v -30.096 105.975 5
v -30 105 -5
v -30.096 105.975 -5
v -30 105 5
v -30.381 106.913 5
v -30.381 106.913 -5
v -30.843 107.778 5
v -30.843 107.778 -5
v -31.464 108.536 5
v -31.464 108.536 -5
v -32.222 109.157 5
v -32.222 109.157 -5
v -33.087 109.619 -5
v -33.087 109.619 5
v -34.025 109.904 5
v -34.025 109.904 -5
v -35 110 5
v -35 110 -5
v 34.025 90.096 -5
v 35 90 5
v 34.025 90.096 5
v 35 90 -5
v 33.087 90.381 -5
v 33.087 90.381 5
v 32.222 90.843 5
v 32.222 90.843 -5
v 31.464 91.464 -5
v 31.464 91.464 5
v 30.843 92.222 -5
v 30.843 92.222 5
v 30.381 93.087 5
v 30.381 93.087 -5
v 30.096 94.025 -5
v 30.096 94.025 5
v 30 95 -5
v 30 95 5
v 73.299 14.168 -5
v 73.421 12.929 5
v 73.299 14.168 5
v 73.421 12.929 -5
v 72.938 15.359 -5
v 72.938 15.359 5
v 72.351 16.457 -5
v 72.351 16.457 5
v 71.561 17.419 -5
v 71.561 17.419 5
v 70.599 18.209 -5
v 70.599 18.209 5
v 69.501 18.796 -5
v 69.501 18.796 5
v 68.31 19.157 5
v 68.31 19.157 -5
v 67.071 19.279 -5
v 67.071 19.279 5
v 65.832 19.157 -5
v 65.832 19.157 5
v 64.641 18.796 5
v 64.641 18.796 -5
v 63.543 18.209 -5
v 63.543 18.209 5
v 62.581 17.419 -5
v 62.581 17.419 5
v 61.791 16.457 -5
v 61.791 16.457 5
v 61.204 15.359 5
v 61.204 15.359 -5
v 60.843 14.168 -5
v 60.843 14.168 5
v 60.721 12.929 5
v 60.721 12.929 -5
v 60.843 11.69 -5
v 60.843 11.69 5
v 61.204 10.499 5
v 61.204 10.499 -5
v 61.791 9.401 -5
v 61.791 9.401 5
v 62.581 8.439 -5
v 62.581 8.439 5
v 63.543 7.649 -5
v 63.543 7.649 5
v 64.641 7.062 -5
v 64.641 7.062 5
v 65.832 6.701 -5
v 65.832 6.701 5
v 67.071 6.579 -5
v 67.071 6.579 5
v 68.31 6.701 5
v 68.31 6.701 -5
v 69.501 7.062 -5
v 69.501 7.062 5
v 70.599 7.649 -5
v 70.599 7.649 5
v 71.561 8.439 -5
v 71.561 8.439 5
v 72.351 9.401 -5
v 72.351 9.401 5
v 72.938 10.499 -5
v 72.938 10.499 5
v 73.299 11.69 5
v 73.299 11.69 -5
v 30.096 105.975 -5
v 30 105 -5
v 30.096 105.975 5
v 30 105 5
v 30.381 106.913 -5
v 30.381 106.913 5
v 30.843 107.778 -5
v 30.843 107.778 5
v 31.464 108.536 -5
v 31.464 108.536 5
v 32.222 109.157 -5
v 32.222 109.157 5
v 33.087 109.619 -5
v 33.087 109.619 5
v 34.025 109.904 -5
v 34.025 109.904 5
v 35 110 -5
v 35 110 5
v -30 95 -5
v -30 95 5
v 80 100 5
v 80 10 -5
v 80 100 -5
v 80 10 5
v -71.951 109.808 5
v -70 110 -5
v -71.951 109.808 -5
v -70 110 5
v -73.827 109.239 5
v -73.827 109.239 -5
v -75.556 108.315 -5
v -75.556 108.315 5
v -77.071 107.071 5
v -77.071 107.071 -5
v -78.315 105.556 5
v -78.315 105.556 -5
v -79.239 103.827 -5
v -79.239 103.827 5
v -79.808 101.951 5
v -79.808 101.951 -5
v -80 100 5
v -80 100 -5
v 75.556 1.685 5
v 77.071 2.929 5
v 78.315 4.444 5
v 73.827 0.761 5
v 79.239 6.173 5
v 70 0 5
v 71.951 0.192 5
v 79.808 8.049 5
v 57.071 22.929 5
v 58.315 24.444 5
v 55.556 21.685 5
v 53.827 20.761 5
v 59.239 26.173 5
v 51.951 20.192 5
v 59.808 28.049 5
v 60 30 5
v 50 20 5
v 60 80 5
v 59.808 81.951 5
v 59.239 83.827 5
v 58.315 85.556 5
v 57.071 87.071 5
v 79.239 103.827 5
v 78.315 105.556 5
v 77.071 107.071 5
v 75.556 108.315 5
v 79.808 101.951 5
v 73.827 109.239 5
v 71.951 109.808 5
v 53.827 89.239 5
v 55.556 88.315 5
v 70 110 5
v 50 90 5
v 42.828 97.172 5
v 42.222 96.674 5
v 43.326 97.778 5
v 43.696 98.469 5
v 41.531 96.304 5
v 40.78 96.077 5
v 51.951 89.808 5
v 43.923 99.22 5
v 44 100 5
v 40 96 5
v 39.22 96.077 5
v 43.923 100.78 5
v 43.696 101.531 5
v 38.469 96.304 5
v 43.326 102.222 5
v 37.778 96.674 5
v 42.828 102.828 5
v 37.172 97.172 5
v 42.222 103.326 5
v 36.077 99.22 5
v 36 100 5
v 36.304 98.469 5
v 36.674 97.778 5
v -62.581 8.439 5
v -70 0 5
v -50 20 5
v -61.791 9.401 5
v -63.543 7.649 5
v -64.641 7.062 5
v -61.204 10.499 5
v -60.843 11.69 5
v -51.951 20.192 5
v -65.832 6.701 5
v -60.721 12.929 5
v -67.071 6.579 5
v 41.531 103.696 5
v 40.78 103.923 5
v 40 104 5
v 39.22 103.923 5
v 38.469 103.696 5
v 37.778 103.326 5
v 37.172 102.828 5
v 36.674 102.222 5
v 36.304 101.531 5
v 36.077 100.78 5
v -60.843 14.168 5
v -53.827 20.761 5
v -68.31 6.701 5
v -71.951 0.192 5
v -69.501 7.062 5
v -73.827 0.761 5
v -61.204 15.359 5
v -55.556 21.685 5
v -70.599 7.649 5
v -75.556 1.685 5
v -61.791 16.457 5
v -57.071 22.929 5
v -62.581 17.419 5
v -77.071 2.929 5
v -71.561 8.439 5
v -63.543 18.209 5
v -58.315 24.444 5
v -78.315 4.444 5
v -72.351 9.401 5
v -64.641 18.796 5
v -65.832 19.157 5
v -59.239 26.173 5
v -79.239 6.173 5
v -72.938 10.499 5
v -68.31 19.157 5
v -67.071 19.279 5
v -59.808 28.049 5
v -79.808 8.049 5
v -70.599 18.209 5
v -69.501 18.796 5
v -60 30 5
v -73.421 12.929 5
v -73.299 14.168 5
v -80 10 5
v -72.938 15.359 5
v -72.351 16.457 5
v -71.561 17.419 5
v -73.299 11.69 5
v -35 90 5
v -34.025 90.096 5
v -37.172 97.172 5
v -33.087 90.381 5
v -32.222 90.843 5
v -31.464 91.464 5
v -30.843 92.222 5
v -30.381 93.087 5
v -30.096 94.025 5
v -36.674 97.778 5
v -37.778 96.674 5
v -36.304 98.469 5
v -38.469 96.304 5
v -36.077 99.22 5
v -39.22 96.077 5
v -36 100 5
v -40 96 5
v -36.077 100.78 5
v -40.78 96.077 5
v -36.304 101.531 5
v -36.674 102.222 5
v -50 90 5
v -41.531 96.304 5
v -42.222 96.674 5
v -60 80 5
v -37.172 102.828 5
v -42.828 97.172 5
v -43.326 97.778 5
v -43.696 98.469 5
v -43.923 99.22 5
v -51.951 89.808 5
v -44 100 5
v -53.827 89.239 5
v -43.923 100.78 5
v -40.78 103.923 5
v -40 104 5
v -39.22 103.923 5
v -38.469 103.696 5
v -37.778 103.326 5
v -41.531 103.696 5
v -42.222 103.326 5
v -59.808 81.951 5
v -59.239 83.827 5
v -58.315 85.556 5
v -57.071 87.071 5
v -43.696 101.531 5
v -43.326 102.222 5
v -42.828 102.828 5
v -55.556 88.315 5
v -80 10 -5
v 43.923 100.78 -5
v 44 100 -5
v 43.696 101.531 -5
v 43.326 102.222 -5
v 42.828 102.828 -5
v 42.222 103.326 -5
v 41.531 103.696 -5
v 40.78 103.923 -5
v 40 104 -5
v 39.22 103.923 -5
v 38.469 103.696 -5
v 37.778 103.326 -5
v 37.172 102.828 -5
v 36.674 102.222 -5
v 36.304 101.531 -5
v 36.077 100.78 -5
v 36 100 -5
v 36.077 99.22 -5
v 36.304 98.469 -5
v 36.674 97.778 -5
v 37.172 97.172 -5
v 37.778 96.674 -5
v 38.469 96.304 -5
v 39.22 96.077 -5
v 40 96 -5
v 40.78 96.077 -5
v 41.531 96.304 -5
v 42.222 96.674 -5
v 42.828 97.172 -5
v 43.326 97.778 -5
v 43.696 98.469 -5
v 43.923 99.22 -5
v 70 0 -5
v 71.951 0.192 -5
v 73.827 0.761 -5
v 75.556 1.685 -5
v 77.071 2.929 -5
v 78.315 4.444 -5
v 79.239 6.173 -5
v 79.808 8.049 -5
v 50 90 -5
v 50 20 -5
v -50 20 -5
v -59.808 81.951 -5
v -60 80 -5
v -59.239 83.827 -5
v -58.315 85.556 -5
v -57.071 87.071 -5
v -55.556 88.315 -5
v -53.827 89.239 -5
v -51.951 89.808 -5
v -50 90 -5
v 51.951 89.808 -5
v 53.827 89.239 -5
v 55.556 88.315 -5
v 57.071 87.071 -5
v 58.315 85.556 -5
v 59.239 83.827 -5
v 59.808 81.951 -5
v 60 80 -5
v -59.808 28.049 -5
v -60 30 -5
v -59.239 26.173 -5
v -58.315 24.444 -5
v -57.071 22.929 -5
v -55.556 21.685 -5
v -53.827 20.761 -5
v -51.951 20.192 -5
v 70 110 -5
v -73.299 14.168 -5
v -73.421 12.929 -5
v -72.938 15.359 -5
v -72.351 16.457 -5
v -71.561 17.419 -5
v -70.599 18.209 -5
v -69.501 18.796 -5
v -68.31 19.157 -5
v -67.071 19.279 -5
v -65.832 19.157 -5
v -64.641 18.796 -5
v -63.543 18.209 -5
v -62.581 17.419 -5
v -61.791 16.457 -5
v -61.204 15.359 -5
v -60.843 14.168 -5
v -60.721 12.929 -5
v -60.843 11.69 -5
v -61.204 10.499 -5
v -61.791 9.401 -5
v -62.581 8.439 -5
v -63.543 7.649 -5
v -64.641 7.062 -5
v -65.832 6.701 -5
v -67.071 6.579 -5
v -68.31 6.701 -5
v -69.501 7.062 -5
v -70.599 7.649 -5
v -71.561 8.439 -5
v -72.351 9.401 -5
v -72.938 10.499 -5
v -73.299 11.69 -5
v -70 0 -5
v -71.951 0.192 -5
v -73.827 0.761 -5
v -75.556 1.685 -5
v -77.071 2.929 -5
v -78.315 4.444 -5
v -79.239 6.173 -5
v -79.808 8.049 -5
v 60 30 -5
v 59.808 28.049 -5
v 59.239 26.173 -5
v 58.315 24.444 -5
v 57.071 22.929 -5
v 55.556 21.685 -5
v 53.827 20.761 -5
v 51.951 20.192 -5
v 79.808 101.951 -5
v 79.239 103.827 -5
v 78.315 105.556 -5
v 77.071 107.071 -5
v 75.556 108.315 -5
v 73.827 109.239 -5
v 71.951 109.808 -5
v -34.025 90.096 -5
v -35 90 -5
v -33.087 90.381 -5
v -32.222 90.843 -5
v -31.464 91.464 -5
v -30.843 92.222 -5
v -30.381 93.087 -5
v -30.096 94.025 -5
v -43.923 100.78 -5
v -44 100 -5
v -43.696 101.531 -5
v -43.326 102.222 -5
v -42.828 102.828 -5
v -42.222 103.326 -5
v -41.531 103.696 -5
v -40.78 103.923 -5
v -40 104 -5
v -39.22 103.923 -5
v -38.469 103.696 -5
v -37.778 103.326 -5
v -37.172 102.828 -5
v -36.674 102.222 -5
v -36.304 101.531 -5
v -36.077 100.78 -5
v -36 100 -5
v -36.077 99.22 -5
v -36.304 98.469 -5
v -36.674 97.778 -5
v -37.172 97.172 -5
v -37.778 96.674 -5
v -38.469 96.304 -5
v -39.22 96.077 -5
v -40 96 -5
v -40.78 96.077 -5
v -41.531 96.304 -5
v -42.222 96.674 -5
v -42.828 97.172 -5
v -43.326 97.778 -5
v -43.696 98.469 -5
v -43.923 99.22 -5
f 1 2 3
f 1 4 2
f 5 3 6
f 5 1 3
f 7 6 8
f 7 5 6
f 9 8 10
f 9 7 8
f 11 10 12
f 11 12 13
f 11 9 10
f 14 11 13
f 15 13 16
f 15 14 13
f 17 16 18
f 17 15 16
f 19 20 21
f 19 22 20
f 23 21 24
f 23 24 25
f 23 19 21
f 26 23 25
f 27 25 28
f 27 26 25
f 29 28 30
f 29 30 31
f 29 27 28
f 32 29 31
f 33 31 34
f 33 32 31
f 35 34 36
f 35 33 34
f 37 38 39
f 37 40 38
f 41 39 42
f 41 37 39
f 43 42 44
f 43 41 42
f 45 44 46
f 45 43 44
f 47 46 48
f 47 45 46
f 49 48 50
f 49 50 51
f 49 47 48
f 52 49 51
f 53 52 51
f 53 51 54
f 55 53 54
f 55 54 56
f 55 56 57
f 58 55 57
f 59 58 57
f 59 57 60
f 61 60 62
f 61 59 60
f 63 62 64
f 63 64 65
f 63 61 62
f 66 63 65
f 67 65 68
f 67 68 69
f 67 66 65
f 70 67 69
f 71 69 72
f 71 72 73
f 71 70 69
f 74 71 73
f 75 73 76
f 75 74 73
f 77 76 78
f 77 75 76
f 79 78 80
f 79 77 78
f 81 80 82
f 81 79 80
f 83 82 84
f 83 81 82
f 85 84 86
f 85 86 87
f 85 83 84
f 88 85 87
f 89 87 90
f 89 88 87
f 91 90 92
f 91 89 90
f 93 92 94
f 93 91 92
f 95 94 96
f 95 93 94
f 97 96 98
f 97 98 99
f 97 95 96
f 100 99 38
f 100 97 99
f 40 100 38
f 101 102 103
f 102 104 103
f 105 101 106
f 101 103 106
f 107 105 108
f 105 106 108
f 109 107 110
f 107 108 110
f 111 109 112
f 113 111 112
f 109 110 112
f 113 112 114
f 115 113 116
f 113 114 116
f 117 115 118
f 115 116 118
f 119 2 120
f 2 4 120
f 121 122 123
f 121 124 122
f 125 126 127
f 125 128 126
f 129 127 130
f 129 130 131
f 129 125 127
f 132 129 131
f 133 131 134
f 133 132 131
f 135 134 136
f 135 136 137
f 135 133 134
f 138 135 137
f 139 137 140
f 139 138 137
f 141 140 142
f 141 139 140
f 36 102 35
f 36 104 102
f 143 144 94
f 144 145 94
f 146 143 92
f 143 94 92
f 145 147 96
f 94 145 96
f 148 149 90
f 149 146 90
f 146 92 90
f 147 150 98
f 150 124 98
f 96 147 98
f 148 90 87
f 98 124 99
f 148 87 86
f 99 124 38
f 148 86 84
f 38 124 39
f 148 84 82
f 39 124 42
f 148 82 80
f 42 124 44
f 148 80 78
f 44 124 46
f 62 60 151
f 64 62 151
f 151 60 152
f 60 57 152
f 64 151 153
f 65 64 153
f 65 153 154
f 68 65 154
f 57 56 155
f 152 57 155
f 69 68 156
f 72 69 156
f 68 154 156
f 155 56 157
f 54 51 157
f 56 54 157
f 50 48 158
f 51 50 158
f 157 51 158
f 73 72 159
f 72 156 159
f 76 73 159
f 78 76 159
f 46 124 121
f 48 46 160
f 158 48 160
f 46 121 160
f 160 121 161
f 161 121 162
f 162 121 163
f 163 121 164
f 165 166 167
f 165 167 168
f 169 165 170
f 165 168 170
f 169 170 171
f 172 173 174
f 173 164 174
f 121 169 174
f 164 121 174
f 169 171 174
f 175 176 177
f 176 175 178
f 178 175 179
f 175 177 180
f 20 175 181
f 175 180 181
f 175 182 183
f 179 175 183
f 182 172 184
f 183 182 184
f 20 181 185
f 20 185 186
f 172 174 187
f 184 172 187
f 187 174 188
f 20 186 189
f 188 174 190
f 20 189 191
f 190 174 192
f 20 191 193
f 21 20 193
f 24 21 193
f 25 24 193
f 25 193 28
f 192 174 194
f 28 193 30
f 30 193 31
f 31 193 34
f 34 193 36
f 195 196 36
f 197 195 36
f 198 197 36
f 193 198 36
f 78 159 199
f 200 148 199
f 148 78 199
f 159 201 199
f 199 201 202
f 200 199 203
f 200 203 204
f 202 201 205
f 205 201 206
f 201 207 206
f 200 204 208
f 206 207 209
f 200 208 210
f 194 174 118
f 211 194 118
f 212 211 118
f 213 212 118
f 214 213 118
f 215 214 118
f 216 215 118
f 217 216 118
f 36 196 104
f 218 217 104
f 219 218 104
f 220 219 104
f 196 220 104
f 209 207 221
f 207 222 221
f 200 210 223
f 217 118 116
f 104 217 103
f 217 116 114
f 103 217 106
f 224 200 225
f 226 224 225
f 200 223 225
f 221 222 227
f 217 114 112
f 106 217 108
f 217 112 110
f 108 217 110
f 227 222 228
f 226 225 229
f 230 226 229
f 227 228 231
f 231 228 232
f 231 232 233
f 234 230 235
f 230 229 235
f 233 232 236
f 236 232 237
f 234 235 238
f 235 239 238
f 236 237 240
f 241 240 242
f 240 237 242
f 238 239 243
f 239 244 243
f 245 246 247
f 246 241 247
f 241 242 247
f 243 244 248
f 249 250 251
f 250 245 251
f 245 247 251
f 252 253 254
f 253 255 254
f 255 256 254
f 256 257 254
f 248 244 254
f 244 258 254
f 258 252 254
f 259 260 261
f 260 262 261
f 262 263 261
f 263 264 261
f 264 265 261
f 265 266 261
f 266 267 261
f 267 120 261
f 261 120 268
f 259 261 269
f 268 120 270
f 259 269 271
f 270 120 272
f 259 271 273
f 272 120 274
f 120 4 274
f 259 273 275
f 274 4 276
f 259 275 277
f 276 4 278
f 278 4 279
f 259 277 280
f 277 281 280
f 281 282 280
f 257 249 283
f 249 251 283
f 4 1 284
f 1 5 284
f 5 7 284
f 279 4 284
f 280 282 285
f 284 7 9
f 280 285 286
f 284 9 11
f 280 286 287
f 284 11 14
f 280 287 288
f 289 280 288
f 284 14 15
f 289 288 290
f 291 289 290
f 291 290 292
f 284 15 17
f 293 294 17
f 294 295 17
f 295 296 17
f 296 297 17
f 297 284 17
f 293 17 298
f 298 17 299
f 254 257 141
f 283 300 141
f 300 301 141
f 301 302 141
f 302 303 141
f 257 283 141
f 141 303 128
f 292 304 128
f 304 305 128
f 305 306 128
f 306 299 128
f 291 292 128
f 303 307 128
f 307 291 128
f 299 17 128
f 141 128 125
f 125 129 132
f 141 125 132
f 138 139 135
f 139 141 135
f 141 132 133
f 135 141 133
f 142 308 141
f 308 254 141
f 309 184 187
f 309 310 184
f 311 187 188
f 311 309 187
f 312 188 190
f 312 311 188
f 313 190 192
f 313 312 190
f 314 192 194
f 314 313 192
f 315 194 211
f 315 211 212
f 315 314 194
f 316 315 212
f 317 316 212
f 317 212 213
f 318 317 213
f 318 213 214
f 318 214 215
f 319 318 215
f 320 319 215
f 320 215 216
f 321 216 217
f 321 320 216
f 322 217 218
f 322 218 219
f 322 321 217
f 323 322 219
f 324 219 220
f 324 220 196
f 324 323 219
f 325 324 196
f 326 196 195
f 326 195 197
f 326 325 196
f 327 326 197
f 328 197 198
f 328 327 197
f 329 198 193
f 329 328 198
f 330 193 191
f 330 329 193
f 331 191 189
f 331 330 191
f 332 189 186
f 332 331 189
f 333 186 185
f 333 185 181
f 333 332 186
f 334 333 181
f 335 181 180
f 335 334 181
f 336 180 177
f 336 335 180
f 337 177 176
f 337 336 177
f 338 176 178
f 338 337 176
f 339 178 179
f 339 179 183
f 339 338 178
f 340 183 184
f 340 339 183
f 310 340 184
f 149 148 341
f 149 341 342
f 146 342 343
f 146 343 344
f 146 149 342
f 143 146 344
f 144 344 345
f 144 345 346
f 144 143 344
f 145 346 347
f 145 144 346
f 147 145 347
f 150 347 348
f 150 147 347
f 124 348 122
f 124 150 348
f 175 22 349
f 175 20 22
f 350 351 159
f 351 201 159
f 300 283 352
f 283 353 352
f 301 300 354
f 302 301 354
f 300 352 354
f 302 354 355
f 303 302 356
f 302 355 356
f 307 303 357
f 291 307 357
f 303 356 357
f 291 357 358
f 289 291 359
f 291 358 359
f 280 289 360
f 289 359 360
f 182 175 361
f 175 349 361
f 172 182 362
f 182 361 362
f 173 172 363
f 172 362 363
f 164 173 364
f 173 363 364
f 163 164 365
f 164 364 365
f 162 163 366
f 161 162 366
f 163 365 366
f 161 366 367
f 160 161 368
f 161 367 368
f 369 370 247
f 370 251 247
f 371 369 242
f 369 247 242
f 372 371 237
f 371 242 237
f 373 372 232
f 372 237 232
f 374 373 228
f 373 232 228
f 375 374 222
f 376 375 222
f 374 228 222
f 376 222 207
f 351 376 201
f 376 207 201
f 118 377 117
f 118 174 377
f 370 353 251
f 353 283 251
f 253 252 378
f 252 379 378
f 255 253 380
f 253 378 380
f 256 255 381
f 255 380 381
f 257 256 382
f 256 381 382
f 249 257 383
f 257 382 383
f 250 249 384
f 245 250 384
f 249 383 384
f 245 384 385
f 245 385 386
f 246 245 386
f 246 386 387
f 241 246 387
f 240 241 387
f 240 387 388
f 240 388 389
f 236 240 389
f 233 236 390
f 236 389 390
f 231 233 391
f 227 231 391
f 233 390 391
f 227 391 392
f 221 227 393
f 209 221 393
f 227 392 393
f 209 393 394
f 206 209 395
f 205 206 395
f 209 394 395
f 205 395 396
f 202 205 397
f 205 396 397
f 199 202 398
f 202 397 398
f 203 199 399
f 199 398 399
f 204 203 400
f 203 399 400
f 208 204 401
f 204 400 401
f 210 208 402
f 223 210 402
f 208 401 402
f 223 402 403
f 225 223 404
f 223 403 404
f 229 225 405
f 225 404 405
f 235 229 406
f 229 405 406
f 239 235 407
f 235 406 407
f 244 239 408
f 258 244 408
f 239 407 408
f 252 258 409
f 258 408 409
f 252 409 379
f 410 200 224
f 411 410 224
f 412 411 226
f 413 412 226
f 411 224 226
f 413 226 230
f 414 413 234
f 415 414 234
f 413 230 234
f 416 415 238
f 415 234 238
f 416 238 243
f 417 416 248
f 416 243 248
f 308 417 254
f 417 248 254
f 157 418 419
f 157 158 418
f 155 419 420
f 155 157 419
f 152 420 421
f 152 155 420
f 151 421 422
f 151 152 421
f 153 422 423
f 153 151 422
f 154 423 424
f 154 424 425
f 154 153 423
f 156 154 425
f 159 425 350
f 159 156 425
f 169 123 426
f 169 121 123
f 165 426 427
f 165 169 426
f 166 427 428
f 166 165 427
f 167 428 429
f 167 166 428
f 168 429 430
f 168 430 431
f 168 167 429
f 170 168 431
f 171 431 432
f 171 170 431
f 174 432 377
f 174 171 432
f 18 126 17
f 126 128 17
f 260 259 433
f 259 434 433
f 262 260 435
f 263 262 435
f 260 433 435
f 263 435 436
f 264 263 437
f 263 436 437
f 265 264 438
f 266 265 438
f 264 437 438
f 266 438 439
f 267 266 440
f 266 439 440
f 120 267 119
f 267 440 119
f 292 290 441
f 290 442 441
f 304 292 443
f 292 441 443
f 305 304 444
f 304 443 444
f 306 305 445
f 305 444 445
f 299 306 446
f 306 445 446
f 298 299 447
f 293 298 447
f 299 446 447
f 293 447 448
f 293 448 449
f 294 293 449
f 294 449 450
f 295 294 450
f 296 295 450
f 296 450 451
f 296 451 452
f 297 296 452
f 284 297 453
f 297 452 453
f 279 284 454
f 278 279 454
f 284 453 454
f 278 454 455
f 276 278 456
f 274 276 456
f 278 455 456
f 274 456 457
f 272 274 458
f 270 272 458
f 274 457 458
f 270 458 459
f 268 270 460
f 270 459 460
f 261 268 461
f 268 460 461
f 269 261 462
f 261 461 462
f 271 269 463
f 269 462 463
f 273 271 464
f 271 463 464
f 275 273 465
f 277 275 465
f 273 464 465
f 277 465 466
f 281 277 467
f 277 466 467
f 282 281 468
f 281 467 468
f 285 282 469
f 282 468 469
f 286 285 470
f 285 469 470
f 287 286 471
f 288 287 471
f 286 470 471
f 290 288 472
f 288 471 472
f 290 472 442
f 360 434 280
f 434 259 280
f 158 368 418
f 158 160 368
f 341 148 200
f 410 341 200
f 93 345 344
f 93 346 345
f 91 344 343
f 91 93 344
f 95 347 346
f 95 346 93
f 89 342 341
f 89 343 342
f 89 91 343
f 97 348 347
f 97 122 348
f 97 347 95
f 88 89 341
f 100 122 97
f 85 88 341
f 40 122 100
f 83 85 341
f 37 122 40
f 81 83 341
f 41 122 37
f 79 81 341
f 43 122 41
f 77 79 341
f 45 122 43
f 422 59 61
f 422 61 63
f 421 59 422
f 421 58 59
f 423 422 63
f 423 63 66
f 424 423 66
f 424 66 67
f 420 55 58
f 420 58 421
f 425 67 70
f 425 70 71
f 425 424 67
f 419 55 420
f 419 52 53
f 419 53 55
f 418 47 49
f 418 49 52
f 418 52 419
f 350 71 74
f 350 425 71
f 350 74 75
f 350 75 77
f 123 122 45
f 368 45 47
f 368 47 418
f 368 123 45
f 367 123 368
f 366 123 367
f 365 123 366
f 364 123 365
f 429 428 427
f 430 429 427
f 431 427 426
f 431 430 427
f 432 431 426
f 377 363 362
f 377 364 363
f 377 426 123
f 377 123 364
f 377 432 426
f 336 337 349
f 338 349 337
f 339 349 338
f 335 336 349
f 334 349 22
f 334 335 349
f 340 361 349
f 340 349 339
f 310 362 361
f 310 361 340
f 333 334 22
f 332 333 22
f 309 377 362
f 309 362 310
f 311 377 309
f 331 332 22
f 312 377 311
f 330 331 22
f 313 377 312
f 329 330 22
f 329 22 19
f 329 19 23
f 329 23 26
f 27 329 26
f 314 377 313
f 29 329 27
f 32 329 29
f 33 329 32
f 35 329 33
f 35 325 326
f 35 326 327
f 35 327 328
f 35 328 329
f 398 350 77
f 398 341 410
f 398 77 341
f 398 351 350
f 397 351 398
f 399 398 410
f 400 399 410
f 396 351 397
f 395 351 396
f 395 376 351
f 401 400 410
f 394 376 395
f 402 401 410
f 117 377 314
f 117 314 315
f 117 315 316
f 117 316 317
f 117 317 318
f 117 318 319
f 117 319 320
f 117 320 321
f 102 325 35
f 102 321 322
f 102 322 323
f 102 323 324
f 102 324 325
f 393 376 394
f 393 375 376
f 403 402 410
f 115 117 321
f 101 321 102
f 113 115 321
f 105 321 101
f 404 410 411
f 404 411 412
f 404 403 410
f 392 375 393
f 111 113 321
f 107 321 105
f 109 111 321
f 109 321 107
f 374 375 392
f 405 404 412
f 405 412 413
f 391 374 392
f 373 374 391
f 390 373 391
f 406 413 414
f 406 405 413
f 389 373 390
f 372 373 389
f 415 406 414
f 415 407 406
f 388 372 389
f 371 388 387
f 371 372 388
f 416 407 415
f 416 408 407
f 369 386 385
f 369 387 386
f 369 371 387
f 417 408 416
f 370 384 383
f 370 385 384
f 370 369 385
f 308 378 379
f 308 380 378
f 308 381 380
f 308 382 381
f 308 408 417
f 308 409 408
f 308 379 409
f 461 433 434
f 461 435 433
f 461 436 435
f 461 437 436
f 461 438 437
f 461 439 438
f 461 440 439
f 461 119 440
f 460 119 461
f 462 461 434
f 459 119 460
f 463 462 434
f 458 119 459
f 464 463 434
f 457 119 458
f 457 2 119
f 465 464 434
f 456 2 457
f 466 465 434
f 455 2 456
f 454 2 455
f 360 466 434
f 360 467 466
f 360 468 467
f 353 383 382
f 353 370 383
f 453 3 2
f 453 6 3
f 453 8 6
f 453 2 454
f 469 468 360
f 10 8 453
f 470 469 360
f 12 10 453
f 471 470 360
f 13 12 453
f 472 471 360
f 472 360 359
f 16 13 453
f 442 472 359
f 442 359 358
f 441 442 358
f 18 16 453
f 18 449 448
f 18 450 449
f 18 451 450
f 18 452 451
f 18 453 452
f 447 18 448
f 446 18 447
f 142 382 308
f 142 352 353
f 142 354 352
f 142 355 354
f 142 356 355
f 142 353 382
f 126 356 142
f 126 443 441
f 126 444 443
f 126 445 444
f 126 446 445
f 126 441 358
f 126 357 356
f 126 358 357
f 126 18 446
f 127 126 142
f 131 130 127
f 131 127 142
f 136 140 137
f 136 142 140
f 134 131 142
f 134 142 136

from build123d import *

# Parameters (mm, degrees)
SKETCH1_R           = 6.35
SKETCH1_R_2         = 4
BOSS_EXTRUDE1_DEPTH = 5
FILLET1_R           = 10
FILLET2_R           = 5


with BuildPart() as part:
    # Sketch1 → Boss-Extrude1 (new, symmetric)
    with BuildSketch(Plane.XY):
        with BuildLine():
            Line((0, 20), (0, 0))
            Line((0, 0), (70, 0))
            ThreePointArc((70, 0), (77.071067812, 2.928932188), (80, 10))
            Line((80, 10), (80, 110))
            Line((80, 110), (30, 110))
            Line((30, 110), (30, 90))
            Line((30, 90), (60, 90))
            Line((60, 90), (60, 30))
            ThreePointArc((60, 30), (57.071067812, 22.928932188), (50, 20))
            Line((50, 20), (0, 20))
        make_face()
        with Locations((67.071067812, 12.928932188)):
            Circle(SKETCH1_R, mode=Mode.SUBTRACT)
        with Locations((40, 100)):
            Circle(SKETCH1_R_2, mode=Mode.SUBTRACT)
    boss_extrude1 = extrude(amount=BOSS_EXTRUDE1_DEPTH, both=True)

    # Mirror1: Boss-Extrude1 across plane
    add(boss_extrude1.mirror(Plane(origin=(0, 0, -5), x_dir=(0, 0, 1), z_dir=(-1, 0, 0))))

    # Fillet1
    fillet1_edges = [part.edges().sort_by_distance(p)[0] for p in [
        (60, 90, 0),
        (80, 110, 0),
        (-80, 110, 0),
        (-60, 90, 0),
    ]]
    fillet(fillet1_edges, radius=FILLET1_R)

    # Fillet2
    fillet2_edges = [part.edges().sort_by_distance(p)[0] for p in [
        (30, 90, 0),
        (30, 110, 0),
        (-30, 110, 0),
        (-30, 90, 0),
    ]]
    fillet(fillet2_edges, radius=FILLET2_R)


solid = part.part
